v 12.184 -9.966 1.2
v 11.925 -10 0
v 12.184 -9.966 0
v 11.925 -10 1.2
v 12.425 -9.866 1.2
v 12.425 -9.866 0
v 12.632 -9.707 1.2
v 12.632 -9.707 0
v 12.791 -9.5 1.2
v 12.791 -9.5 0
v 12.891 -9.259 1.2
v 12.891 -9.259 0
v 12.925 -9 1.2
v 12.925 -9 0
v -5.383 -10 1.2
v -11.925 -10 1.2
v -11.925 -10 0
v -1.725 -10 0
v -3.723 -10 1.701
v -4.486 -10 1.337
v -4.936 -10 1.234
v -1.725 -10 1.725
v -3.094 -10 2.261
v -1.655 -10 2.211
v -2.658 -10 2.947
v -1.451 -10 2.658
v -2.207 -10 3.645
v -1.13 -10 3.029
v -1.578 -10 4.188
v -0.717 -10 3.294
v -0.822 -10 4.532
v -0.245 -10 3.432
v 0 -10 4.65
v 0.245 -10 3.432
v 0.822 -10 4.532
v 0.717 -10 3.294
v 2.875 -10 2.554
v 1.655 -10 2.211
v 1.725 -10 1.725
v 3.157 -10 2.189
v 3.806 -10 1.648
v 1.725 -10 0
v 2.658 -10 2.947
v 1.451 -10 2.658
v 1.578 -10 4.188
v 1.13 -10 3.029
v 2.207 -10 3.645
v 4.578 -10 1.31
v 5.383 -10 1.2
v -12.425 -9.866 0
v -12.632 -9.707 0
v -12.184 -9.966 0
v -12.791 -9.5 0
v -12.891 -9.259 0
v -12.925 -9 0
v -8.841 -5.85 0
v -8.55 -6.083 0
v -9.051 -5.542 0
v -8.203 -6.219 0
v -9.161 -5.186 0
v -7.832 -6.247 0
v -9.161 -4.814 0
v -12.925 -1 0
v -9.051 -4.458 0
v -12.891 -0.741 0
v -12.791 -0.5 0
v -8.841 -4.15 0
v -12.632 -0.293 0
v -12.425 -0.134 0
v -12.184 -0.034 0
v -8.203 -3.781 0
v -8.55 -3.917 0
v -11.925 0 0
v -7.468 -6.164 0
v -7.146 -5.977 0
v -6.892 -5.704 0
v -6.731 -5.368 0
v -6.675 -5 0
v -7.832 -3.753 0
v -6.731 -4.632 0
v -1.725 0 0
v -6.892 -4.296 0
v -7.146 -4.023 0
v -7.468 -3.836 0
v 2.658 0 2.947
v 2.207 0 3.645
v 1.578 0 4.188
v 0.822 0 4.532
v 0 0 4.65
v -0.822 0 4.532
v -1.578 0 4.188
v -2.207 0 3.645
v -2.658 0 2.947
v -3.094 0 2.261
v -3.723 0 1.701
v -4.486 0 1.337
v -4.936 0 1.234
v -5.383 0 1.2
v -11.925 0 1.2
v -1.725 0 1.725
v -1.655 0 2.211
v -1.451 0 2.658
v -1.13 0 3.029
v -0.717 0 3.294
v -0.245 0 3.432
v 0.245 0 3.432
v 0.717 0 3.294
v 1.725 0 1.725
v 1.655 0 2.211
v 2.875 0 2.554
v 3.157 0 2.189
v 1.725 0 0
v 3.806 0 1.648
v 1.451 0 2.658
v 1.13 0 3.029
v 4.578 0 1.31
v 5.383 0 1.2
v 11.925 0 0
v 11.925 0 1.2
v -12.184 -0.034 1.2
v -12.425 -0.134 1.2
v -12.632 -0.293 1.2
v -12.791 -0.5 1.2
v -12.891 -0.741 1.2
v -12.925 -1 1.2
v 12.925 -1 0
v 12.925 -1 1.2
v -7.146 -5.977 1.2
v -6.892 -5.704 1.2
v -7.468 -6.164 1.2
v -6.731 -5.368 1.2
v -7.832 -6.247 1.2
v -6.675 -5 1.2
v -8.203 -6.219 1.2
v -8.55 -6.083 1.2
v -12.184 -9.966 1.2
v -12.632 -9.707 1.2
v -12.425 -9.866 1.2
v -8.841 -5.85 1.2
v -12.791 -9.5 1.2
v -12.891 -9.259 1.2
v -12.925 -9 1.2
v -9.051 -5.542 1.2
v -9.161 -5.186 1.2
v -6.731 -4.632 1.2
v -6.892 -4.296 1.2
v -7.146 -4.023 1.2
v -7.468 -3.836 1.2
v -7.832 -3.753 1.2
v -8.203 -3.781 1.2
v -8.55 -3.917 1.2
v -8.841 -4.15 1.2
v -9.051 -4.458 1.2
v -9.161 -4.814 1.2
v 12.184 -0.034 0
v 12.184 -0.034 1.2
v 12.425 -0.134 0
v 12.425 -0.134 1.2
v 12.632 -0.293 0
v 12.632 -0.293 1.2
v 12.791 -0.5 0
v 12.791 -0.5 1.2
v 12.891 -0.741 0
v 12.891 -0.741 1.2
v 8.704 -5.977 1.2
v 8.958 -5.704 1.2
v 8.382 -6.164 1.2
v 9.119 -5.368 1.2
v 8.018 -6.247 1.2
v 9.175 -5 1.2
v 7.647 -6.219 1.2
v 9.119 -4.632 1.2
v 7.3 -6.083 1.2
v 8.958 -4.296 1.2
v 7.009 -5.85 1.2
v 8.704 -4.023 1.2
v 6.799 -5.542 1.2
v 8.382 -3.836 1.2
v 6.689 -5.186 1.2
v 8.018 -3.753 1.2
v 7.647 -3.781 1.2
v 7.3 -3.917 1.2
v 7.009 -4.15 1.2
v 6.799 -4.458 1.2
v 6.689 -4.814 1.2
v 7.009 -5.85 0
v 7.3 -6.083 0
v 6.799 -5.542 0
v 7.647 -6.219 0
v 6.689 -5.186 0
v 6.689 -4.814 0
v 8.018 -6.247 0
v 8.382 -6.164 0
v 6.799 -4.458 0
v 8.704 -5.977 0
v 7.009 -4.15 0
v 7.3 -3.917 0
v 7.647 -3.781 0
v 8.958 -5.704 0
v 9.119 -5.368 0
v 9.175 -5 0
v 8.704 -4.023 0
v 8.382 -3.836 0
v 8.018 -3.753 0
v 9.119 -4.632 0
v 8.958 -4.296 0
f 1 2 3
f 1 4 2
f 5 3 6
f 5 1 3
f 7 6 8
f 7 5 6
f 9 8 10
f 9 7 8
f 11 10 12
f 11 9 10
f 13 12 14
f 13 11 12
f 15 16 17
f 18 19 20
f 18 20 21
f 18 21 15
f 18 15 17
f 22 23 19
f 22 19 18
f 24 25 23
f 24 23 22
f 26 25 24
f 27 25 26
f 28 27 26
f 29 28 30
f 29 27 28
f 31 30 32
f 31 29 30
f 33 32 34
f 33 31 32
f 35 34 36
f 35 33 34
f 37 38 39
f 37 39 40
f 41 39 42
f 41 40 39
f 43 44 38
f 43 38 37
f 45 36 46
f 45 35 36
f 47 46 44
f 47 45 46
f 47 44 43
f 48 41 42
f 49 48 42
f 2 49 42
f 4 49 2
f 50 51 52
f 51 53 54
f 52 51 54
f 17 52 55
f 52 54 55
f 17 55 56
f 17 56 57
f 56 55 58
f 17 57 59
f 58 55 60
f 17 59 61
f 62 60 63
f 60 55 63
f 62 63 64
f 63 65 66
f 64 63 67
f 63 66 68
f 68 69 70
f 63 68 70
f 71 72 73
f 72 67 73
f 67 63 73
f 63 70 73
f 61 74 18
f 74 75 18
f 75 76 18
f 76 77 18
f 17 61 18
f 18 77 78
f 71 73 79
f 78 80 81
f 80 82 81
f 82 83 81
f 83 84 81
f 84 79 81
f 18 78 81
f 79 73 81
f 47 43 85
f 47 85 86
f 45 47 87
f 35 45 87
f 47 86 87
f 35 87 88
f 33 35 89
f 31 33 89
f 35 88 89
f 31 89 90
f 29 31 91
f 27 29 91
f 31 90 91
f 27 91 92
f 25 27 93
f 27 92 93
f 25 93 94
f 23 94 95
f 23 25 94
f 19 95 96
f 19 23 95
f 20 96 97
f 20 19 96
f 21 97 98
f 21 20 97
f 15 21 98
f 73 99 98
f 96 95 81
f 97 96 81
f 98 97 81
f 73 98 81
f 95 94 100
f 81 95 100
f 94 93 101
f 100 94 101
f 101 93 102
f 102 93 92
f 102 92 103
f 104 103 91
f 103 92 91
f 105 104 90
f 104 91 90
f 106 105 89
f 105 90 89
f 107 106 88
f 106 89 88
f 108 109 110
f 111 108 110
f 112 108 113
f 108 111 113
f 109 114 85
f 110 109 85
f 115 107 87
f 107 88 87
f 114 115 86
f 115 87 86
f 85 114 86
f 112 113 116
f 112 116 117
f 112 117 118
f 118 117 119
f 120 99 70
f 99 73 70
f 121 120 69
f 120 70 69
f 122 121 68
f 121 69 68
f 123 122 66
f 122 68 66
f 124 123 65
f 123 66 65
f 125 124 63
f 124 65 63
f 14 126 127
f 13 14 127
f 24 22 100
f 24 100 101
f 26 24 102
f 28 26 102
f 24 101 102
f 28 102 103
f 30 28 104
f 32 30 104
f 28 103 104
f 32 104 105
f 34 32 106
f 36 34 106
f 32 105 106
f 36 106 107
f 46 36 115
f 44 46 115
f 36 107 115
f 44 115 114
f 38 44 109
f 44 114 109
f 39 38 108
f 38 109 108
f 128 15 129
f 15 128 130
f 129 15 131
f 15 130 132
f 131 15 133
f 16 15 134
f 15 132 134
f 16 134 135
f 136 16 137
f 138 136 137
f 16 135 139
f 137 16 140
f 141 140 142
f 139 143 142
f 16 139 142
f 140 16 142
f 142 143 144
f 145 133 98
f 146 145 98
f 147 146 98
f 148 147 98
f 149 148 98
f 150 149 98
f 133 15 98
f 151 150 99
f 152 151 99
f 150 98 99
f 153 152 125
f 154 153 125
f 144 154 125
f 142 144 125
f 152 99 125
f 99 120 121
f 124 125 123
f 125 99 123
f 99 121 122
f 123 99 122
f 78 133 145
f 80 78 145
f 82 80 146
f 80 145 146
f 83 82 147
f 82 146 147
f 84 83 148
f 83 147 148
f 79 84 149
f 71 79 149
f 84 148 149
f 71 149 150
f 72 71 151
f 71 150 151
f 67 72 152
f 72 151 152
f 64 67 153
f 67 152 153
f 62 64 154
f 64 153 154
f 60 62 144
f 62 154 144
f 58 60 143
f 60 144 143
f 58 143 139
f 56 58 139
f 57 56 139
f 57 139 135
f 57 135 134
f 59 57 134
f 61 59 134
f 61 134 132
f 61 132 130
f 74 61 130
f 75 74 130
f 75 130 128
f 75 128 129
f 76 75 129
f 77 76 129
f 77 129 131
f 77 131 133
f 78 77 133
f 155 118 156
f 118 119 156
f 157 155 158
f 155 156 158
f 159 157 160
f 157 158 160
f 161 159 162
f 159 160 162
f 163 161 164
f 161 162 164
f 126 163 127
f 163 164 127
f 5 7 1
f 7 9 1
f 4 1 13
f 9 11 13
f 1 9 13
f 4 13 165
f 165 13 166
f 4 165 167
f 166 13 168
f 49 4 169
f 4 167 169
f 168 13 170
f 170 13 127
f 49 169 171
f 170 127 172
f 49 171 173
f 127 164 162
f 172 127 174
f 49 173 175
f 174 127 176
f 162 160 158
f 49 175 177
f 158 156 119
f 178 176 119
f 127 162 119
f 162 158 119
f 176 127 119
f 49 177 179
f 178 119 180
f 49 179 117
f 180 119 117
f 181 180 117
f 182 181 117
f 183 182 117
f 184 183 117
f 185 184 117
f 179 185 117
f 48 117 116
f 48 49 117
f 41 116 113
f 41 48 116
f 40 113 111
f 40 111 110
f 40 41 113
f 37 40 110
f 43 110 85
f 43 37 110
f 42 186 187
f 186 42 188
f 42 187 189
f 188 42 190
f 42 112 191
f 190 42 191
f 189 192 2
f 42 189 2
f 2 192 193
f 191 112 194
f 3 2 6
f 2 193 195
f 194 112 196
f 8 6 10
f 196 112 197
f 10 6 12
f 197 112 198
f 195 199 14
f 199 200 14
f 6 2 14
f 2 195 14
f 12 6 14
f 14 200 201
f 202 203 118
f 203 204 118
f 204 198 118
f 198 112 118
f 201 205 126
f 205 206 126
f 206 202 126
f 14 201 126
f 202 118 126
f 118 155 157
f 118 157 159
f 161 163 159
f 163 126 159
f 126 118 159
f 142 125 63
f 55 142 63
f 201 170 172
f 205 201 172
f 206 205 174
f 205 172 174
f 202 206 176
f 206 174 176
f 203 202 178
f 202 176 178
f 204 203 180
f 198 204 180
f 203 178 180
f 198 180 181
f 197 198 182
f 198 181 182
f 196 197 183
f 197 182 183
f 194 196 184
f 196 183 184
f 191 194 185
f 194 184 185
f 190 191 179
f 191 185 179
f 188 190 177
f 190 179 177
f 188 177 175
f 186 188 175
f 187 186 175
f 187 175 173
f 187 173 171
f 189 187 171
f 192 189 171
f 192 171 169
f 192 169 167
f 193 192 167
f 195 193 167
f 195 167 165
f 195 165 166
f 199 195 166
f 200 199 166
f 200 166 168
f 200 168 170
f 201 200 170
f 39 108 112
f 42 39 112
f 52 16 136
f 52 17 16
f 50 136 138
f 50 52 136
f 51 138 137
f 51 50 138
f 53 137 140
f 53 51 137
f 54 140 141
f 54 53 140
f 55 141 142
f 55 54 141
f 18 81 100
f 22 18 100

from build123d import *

# Parameters (mm, degrees)
F1_DEPTH = 10
F2_R     = 1.25
F3_DEPTH = 1.201
F4_R     = 1
F5_R     = 3


with BuildPart() as f1:
    # F0 (on Front) → F1 (new body)
    with BuildSketch(Plane.XZ):
        with BuildLine():
            ThreePointArc((-1.725, 1.725), (0, 3.45), (1.725, 1.725))
            Line((1.725, 1.725), (1.725, 0))
            Line((1.725, 0), (2.925, 0))
            Line((2.925, 0), (12.925, 0))
            Line((12.925, 0), (12.925, 1.2))
            Line((12.925, 1.2), (2.925, 1.2))
            Line((2.925, 1.2), (2.925, 1.725))
            ThreePointArc((2.925, 1.725), (0, 4.65), (-2.925, 1.725))
            Line((-2.925, 1.725), (-2.925, 1.2))
            Line((-2.925, 1.2), (-12.925, 1.2))
            Line((-12.925, 1.2), (-12.925, 0))
            Line((-12.925, 0), (-2.925, 0))
            Line((-2.925, 0), (-1.725, 0))
            Line((-1.725, 0), (-1.725, 1.725))
        make_face()
    extrude(amount=F1_DEPTH)

    # F2 (on face) → F3 (cut, through all)
    with BuildSketch(Plane.XY.offset(1.2)):
        with Locations((7.925, -5)):
            Circle(F2_R)
        with Locations((-7.925, -5)):
            Circle(F2_R)
    extrude(amount=-F3_DEPTH, mode=Mode.SUBTRACT)

    # F4
    f4_edges = [f1.edges().sort_by_distance(p)[0] for p in [
        (12.925, -10, 0.6),
        (-12.925, -10, 0.6),
        (12.925, 0, 0.6),
        (-12.925, 0, 0.6),
    ]]
    fillet(f4_edges, radius=F4_R)

    # F5
    f5_edges = [f1.edges().sort_by_distance(p)[0] for p in [
        (2.925, -5, 1.2),
        (-2.925, -5, 1.2),
    ]]
    fillet(f5_edges, radius=F5_R)


solid = f1.part
